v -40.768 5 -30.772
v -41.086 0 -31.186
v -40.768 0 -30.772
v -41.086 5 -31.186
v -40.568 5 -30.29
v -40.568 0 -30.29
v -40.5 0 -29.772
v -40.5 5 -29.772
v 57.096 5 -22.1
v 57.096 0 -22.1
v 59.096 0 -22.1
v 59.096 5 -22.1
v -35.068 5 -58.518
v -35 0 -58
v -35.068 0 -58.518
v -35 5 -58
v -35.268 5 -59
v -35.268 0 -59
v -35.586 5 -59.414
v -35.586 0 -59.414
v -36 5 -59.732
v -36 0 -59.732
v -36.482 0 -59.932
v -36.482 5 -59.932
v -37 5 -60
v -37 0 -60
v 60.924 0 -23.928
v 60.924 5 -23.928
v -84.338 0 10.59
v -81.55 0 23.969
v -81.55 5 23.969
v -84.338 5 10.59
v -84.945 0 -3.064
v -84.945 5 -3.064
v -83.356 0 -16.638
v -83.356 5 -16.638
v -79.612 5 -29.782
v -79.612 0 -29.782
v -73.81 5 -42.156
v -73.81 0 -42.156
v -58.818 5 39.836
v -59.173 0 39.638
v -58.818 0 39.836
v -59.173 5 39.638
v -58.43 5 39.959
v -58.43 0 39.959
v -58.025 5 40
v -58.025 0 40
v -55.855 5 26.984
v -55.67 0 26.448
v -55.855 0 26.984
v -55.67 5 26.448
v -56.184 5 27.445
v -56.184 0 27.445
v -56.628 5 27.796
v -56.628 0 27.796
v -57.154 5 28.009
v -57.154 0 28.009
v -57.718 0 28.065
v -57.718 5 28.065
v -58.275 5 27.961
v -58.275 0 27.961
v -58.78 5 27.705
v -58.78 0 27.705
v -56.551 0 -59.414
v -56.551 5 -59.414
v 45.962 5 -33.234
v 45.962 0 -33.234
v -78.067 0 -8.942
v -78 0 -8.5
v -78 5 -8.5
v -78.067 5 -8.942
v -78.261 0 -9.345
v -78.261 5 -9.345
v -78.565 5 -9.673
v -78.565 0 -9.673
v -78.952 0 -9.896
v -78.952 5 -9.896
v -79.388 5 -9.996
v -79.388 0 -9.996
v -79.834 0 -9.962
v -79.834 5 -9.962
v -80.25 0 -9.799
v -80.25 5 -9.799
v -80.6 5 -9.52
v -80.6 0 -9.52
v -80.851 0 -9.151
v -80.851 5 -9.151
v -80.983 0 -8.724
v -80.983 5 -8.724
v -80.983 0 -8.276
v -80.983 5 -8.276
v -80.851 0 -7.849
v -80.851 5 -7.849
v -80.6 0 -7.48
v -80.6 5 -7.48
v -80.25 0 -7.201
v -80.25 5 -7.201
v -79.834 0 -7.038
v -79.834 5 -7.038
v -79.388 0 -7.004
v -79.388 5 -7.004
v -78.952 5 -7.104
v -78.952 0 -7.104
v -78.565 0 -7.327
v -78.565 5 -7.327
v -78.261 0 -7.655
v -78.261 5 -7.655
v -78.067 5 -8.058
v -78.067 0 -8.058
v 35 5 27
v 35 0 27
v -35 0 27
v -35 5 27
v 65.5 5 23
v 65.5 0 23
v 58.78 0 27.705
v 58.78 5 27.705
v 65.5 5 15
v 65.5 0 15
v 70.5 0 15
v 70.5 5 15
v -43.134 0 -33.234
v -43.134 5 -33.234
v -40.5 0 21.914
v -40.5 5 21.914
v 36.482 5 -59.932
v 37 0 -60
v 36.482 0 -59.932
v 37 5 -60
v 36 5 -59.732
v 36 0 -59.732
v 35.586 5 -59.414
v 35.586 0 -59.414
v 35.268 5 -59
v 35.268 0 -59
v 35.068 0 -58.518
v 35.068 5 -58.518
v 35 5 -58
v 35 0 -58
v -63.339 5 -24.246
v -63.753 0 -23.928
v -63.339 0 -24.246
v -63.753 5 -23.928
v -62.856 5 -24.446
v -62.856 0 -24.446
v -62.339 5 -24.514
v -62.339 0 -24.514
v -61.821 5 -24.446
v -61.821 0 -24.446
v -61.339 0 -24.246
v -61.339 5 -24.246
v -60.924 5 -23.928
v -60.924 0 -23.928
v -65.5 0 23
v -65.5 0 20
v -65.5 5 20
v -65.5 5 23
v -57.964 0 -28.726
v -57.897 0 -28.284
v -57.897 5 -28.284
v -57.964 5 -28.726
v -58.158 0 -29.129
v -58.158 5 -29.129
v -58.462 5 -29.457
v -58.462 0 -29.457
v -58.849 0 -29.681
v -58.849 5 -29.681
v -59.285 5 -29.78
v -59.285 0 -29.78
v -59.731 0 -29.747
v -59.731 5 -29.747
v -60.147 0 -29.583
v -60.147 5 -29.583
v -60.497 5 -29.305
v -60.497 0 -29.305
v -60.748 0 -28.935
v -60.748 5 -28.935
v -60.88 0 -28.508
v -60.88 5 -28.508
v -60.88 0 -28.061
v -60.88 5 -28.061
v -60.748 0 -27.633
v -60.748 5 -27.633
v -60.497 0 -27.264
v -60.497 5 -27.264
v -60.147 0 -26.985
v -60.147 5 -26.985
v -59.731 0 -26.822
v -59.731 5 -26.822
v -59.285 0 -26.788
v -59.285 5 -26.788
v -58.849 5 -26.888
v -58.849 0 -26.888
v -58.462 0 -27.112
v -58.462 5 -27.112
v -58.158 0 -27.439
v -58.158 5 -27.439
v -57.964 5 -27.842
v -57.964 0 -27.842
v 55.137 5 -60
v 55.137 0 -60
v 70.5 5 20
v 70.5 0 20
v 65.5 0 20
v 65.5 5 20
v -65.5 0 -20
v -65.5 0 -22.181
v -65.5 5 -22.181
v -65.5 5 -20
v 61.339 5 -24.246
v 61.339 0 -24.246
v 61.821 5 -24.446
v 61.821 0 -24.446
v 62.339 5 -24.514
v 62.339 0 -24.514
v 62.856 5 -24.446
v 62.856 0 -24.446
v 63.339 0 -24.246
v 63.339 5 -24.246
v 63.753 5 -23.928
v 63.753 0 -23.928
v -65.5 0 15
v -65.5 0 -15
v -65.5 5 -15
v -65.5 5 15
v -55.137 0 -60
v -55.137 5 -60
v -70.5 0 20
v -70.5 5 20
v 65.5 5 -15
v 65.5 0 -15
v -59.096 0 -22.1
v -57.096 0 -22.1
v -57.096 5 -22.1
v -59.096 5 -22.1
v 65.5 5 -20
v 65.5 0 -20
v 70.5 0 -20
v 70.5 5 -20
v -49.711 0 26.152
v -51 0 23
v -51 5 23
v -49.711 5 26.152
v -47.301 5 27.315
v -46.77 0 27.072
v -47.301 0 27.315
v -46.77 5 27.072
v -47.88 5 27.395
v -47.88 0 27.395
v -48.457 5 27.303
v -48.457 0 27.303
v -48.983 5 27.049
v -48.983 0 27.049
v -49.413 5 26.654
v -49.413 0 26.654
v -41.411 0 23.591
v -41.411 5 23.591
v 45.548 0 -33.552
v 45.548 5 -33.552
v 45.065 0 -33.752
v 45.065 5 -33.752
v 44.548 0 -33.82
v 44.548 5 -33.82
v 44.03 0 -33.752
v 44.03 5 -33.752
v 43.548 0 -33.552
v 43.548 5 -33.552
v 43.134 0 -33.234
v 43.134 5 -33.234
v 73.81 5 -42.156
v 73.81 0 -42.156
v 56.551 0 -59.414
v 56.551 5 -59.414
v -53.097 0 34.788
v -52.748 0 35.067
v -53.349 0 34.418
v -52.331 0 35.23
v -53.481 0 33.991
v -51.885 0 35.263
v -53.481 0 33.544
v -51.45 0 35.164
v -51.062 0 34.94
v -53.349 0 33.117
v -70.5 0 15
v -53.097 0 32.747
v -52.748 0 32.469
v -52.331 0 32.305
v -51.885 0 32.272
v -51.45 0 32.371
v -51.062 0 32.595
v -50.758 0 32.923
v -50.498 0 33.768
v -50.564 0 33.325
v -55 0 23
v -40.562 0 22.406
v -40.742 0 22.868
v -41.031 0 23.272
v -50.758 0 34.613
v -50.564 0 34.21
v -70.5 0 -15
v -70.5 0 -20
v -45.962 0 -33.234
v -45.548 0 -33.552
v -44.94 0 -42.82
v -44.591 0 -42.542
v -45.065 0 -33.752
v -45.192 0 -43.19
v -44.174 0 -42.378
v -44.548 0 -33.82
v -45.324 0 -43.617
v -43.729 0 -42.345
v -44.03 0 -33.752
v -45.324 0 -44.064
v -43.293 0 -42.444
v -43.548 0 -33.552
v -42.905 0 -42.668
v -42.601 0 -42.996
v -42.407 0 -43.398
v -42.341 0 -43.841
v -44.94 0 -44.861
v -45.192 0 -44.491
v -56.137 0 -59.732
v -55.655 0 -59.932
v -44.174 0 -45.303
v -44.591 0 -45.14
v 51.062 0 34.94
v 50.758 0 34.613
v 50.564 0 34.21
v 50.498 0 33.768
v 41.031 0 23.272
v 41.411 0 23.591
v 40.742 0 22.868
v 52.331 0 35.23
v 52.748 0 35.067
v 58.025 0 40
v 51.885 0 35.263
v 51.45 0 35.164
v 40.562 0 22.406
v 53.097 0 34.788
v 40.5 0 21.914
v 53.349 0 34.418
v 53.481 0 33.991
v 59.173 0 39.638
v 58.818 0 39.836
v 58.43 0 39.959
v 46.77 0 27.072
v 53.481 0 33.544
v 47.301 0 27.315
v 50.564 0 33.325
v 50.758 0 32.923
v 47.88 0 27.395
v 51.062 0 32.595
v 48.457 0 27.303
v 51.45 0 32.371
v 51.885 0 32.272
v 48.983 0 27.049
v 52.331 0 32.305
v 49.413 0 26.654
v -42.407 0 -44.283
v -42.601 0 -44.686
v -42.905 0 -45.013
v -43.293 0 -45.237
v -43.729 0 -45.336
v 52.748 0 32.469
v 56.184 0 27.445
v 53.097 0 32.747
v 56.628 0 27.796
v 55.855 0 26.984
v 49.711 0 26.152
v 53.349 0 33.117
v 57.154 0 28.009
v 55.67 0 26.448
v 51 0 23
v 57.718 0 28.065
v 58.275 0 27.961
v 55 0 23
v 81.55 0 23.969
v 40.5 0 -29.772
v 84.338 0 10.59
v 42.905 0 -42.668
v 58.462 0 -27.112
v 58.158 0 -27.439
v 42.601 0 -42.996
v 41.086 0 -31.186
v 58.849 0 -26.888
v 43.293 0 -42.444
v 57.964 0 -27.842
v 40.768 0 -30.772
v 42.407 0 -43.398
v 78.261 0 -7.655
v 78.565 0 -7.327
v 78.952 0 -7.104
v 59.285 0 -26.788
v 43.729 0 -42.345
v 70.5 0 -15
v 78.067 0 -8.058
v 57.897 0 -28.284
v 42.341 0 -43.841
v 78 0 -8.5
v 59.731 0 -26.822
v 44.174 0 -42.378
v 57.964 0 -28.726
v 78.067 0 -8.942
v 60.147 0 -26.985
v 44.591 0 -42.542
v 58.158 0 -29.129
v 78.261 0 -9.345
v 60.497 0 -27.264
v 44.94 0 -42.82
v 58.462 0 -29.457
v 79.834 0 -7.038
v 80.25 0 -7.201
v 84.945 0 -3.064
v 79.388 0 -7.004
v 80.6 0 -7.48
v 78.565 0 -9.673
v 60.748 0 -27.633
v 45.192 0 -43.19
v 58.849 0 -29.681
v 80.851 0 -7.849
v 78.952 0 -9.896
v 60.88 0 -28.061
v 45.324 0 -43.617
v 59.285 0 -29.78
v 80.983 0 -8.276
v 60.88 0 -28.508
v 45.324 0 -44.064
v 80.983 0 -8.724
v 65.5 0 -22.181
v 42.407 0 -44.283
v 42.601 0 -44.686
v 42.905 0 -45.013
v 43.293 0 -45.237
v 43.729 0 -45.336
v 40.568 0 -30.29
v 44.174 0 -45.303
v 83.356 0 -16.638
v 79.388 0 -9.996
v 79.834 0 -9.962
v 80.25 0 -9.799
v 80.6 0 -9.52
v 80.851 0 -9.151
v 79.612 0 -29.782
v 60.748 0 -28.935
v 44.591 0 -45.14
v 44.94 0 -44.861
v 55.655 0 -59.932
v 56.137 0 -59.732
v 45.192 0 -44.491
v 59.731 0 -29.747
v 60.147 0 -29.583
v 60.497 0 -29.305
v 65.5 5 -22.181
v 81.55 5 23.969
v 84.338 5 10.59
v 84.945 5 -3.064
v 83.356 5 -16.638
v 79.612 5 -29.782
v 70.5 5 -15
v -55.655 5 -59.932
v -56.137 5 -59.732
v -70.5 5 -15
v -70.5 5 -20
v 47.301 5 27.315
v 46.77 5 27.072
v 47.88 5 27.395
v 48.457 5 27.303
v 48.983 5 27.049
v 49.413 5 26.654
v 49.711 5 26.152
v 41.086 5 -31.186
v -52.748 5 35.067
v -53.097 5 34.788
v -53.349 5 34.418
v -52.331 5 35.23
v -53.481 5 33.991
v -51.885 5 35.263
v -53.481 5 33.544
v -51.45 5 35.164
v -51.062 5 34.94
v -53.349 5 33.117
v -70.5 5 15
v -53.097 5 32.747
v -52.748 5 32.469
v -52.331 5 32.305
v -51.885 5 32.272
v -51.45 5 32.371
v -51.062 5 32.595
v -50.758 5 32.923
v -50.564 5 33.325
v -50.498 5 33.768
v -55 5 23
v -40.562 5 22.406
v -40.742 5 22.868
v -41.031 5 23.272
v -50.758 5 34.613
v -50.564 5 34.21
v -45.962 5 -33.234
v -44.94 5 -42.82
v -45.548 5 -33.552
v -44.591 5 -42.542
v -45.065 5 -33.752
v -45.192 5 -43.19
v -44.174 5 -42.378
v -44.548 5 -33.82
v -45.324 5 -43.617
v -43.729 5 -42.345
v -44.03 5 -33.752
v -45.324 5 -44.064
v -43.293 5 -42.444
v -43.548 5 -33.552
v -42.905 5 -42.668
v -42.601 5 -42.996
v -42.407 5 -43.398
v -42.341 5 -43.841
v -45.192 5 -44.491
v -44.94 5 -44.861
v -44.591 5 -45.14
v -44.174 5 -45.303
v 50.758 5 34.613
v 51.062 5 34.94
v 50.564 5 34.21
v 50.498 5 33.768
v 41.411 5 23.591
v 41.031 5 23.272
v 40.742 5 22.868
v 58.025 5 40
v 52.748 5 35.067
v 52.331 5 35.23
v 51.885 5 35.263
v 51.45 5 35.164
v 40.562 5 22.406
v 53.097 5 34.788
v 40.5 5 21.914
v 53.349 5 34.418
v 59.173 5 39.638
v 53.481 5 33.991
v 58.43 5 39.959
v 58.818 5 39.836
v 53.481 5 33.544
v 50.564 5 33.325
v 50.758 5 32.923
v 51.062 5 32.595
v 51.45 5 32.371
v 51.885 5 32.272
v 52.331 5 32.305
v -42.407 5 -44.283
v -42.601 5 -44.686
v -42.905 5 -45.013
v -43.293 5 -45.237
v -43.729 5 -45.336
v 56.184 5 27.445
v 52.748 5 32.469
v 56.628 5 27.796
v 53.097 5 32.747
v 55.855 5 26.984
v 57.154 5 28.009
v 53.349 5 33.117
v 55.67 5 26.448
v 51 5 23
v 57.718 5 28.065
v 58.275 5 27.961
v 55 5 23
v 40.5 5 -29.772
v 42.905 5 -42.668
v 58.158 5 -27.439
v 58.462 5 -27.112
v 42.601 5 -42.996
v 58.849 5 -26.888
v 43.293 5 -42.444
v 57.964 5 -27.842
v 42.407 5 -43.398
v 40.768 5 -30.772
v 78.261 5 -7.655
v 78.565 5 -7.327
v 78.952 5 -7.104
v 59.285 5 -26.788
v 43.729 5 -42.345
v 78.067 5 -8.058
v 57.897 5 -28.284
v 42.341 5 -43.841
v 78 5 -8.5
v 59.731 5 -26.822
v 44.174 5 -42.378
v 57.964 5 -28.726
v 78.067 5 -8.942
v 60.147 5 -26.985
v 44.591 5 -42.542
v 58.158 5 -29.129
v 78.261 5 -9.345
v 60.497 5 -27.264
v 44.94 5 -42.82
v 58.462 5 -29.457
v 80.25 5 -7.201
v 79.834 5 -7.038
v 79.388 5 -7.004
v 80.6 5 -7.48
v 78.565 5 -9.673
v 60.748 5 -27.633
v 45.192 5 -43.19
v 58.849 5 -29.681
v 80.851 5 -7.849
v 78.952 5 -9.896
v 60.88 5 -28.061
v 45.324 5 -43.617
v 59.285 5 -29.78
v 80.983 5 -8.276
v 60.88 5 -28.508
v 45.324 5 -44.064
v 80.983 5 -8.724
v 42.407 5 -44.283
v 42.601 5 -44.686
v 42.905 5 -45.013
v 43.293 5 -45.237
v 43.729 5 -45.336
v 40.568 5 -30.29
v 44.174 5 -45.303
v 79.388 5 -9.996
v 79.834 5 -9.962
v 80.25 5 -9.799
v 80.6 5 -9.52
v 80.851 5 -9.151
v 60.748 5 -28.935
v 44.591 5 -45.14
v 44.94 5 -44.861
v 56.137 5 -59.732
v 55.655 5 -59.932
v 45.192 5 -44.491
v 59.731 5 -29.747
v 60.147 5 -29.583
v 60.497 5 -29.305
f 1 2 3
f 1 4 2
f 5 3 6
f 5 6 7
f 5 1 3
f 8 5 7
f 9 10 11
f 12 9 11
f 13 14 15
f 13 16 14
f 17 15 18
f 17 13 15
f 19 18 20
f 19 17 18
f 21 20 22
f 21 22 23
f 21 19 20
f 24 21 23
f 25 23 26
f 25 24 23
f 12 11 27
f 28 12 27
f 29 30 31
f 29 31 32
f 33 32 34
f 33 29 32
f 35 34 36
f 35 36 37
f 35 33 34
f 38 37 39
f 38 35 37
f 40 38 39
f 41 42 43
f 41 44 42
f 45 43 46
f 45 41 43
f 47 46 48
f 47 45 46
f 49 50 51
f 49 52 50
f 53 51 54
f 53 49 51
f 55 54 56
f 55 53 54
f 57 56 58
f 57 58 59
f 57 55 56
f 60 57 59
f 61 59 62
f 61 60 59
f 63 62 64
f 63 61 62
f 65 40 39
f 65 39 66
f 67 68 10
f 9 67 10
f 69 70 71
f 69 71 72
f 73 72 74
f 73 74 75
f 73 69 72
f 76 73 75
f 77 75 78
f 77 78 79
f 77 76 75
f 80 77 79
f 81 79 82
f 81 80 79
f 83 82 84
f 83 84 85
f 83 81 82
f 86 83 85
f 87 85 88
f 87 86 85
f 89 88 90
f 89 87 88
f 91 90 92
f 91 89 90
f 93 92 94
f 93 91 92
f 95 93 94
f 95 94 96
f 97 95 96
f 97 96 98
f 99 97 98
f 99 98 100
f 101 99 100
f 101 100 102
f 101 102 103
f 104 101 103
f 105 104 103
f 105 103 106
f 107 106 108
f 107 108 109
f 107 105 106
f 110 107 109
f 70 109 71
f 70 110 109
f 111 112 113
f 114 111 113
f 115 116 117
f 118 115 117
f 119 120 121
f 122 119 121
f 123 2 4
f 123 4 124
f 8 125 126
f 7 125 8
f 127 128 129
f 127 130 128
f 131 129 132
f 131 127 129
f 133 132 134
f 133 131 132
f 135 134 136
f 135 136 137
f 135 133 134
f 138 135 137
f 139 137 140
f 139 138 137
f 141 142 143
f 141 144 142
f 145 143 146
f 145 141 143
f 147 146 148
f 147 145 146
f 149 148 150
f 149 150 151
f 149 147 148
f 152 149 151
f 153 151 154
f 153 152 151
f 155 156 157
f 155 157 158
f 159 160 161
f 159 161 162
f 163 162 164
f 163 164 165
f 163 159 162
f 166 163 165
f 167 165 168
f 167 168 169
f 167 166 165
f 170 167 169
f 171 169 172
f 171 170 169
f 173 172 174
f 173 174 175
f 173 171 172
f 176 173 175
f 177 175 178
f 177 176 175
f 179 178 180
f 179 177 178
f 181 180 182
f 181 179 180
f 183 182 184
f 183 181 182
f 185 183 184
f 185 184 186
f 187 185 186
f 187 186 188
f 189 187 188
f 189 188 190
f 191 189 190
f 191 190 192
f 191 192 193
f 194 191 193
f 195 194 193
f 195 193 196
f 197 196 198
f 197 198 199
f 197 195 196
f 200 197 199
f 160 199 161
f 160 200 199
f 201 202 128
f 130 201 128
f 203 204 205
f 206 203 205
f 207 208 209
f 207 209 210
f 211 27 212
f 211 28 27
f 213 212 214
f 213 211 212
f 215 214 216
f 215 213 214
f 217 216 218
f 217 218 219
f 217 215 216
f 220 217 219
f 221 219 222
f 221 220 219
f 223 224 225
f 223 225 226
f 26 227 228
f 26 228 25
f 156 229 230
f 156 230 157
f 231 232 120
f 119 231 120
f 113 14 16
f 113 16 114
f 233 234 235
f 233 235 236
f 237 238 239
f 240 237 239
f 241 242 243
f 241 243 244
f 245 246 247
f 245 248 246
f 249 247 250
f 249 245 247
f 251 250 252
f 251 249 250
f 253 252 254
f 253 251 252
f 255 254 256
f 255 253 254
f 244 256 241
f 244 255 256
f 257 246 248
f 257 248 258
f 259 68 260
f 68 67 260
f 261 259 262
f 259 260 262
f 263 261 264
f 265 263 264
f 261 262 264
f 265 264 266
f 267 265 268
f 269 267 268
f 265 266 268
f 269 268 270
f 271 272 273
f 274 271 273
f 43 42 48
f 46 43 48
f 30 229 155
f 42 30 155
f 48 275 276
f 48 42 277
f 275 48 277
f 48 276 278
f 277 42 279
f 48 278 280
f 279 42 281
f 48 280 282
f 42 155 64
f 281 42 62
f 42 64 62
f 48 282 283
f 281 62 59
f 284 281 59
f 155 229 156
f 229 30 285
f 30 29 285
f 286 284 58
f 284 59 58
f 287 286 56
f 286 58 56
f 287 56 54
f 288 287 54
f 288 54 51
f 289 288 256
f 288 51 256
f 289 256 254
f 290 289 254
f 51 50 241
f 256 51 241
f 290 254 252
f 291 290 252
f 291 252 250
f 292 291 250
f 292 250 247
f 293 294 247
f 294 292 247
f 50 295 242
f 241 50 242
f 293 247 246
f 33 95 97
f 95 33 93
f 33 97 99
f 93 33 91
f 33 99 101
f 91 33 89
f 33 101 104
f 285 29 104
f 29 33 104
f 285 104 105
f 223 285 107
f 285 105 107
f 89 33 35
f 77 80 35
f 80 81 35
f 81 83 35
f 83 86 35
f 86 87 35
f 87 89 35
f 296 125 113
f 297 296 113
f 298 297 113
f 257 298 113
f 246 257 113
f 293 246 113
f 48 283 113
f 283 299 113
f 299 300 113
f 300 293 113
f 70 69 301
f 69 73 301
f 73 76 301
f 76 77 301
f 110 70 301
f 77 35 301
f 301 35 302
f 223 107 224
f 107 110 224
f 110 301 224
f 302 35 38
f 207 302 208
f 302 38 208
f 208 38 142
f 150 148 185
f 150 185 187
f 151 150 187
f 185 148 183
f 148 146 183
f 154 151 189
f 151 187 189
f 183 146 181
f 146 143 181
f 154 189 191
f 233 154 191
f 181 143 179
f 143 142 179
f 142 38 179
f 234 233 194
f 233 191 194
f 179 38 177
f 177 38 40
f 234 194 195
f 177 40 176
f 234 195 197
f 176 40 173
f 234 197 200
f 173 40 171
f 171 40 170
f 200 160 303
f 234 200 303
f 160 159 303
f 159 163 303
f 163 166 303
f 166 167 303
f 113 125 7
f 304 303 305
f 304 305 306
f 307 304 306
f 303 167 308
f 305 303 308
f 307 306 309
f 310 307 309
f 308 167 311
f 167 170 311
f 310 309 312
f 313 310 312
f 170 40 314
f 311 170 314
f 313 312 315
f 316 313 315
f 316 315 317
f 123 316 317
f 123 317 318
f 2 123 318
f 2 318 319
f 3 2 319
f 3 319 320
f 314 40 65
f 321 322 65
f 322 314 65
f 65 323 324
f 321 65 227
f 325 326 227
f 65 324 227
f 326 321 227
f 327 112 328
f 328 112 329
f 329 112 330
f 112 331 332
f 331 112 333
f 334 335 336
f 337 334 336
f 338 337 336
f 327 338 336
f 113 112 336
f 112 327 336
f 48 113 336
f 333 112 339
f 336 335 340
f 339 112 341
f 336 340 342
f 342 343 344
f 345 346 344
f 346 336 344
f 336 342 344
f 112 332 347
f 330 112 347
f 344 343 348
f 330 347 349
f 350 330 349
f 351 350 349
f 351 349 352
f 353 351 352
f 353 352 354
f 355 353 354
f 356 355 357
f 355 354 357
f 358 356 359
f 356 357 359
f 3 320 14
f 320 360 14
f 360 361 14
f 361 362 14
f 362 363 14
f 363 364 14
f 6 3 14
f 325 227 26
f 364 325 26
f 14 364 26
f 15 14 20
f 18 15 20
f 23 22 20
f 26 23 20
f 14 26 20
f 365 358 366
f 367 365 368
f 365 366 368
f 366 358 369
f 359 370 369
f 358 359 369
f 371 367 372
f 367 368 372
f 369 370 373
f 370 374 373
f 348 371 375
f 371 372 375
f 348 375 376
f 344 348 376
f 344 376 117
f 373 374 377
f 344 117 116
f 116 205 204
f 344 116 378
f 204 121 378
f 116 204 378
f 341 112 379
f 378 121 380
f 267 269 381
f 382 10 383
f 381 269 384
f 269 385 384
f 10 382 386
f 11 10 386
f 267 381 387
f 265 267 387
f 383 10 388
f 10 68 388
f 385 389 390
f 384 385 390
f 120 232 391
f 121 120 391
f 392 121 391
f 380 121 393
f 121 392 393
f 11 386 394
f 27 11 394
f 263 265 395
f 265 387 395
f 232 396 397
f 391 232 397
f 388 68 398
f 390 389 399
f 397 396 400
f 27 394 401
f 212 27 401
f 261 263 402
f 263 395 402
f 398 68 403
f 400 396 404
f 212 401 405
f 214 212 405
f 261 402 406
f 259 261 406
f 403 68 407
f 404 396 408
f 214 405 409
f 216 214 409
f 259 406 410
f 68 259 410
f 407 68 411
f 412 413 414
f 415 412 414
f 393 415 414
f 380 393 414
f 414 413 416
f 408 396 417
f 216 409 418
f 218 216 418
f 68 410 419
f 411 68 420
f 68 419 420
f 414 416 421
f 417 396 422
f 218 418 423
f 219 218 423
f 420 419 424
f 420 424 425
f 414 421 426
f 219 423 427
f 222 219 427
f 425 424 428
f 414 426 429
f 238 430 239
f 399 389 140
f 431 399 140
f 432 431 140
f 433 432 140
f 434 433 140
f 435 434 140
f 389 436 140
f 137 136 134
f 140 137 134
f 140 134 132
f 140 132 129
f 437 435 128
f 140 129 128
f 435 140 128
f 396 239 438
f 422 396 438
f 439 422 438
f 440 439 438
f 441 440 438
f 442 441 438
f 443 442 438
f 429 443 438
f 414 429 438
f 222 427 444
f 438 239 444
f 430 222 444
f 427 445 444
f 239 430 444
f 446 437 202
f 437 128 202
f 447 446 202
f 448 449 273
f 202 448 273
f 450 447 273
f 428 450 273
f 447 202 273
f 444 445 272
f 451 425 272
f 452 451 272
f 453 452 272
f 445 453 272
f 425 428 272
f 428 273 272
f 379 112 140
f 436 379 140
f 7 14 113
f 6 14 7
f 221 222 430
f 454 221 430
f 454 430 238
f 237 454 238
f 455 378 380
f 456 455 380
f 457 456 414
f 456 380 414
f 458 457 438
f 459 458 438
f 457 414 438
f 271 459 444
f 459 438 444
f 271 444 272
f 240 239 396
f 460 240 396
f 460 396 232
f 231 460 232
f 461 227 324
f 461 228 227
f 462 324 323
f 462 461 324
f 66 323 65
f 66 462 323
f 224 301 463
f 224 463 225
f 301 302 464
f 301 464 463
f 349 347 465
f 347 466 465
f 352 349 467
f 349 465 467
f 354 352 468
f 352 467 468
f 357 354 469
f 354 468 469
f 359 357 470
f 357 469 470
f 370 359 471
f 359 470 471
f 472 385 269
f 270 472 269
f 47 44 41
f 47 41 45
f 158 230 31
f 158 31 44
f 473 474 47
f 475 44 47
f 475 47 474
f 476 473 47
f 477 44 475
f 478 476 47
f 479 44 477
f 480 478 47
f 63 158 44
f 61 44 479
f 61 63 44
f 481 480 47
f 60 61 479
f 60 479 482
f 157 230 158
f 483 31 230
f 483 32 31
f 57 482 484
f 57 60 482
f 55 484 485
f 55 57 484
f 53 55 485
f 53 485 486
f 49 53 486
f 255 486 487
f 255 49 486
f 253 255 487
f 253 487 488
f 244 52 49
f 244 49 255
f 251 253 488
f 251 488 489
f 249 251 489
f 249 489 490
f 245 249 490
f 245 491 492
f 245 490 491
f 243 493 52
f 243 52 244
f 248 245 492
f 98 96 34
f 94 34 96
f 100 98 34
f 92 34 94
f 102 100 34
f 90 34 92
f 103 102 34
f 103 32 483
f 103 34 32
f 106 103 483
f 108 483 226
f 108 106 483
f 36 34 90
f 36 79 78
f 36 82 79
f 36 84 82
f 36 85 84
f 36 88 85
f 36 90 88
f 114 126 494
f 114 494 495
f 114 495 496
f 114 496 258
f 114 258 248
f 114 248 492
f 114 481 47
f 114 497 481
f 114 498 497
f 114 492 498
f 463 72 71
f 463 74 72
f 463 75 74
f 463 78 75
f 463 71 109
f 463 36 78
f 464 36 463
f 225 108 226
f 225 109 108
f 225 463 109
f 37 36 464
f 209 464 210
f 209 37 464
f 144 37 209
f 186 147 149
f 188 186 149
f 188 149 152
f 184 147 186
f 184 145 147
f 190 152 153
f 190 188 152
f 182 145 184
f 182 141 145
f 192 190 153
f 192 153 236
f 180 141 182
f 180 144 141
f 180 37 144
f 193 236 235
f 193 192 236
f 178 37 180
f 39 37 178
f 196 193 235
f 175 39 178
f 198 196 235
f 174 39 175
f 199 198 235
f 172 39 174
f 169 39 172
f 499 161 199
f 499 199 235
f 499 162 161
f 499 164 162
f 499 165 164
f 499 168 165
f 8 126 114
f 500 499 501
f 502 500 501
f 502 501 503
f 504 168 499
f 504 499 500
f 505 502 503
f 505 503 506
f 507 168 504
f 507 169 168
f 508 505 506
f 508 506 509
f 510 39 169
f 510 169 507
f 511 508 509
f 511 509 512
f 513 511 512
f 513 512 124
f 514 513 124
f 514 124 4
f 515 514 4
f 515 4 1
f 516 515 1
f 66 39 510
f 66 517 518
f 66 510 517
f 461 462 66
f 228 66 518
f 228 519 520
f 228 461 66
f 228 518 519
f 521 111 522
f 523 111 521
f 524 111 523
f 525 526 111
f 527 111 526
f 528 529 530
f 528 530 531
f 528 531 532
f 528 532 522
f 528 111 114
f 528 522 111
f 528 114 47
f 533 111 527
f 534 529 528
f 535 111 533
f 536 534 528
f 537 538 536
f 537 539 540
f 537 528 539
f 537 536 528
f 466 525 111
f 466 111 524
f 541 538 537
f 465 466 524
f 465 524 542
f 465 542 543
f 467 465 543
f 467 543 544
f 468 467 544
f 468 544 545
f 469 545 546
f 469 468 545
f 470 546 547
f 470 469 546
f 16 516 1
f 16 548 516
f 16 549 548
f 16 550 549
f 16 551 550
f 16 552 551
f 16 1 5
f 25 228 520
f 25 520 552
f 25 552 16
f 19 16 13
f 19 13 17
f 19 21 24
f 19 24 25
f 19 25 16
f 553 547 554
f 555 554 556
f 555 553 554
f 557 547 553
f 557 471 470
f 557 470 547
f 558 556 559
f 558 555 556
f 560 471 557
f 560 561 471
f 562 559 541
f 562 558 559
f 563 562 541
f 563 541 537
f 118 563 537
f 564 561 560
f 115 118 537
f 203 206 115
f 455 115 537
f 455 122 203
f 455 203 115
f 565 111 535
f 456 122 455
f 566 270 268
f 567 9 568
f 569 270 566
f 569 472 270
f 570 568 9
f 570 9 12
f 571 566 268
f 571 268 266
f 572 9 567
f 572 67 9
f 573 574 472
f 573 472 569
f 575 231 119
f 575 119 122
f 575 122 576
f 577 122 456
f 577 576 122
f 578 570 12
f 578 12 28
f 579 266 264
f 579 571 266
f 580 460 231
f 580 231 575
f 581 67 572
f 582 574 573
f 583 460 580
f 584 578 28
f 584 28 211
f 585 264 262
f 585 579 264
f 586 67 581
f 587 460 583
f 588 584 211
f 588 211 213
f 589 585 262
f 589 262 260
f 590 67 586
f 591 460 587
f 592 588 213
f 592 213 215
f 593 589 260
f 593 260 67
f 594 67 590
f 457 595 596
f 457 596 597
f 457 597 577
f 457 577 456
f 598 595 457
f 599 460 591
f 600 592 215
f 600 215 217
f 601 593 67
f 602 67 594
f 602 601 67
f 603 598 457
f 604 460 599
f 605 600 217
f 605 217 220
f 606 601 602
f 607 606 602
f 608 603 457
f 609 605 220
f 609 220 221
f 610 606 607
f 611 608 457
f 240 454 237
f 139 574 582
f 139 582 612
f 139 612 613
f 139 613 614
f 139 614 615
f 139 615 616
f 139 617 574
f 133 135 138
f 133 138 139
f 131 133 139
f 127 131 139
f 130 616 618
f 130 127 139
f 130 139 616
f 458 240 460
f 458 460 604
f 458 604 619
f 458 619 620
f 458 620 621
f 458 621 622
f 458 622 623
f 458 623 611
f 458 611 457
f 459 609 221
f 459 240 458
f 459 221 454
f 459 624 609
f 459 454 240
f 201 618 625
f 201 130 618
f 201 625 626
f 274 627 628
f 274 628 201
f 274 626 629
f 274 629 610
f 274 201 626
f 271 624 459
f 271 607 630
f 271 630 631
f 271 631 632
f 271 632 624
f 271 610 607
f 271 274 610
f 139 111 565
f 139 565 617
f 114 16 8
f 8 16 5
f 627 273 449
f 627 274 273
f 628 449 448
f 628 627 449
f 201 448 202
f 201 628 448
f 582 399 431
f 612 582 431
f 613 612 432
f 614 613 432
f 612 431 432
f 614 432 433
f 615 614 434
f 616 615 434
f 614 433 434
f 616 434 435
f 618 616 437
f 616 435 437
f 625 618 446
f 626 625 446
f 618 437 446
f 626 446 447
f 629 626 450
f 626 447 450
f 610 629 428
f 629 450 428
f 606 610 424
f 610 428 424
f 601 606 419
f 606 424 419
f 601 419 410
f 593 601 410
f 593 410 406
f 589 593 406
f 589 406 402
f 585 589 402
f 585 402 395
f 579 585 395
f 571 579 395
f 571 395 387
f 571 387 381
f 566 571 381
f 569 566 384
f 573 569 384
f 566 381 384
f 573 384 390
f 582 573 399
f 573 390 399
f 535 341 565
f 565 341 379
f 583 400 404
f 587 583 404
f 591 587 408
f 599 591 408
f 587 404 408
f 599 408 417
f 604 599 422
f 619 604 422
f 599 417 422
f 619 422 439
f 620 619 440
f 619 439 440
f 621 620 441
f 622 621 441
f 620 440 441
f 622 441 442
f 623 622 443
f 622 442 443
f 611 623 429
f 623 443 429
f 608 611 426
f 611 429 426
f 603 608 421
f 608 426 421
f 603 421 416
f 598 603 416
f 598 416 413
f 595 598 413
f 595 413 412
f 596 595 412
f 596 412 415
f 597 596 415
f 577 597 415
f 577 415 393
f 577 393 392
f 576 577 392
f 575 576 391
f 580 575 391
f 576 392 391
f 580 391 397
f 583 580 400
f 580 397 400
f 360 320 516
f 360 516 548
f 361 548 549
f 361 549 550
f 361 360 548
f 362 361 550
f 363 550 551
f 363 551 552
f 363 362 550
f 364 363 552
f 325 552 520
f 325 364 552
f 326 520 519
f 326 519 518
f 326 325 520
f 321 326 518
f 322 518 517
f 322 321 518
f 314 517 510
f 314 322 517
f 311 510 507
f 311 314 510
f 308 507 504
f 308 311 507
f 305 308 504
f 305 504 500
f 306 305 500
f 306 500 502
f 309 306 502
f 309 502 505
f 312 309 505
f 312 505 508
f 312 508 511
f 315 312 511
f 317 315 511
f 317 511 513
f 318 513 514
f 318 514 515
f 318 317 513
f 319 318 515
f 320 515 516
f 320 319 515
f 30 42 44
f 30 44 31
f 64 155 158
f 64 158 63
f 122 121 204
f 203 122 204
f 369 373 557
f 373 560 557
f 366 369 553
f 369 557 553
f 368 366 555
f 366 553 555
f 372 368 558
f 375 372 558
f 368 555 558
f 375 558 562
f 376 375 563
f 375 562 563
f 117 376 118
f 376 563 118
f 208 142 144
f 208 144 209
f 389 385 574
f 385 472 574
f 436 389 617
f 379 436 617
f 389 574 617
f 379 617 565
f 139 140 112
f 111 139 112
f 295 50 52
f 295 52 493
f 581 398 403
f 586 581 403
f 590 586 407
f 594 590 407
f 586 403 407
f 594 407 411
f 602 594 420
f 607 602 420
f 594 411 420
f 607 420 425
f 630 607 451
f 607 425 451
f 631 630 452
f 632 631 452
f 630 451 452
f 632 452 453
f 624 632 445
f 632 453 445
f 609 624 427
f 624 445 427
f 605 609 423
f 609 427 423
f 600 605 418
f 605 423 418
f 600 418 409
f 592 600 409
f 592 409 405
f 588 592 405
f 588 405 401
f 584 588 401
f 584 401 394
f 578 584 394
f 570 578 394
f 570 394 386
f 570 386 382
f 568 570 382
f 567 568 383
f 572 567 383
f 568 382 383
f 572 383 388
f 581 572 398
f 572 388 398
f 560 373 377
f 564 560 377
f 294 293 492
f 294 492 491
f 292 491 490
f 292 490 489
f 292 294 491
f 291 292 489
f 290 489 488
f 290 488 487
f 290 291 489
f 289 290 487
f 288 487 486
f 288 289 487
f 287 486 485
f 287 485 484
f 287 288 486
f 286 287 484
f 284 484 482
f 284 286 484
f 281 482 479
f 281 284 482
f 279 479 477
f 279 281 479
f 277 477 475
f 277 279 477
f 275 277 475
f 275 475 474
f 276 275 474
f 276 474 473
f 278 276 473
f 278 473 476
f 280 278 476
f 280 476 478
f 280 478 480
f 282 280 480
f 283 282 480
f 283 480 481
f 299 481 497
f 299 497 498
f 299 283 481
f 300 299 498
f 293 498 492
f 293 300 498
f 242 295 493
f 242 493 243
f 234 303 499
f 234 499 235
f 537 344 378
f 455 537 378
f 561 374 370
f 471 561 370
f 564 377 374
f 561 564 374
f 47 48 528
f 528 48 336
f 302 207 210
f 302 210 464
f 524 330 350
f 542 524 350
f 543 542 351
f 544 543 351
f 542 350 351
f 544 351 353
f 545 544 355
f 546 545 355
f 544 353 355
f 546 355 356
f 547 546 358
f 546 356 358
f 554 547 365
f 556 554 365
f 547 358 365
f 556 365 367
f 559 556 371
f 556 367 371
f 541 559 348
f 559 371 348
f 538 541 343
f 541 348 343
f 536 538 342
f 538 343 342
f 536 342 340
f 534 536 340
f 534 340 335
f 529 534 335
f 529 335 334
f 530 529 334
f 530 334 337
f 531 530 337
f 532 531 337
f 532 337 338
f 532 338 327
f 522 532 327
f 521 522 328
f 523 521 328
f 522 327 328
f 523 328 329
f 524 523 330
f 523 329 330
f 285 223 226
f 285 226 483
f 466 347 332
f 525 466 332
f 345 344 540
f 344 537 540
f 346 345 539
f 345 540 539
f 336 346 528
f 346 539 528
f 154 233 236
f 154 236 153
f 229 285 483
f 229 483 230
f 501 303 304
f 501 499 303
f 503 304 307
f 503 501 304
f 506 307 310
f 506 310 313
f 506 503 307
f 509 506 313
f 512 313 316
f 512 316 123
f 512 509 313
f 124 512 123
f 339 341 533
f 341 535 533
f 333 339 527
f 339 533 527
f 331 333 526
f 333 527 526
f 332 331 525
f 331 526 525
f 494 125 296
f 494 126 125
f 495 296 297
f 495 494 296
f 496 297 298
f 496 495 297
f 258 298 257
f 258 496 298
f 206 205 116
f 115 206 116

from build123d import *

# Parameters (mm, degrees)
SKETCH1_R            = 1.5
BOSS_EXTRUDE1_DEPTH  = 5
FILLET1_R            = 2
FILLET1_OF_MIRROR1_R = 2
FILLET2_R            = 2


with BuildPart() as part:
    # Sketch1 → Boss-Extrude1 (new body)
    with BuildSketch(Plane(origin=(0, 0, 0), x_dir=(1, 0, 0), z_dir=(0, 1, 0))):
        with BuildLine():
            Line((-58.655951842, -40), (-81.550499093, -23.96906543))
            ThreePointArc((-81.550499093, -23.96906543), (-84.423538078, 9.882622039), (-73.809947849, 42.155564266))
            Line((-73.809947849, 42.155564266), (-55.965512115, 60))
            Line((-55.965512115, 60), (-35, 60))
            Line((-35, 60), (-35, -27))
            Line((-35, -27), (0, -27))
            Line((0, -27), (0, -40))
            Line((0, -40), (-58.655951842, -40))
        make_face()
        with Locations((-43.840620434, 43.840620434)):
            Circle(SKETCH1_R, mode=Mode.SUBTRACT)
        with Locations((-51.997575213, -33.767620171)):
            Circle(SKETCH1_R, mode=Mode.SUBTRACT)
        with Locations((-59.39696962, 28.284271247)):
            Circle(SKETCH1_R, mode=Mode.SUBTRACT)
        with Locations((-79.5, 8.5)):
            Circle(SKETCH1_R, mode=Mode.SUBTRACT)
        Polygon((-65.5, 22.181240867), (-65.5, 20), (-70.5, 20), (-70.5, 15), (-65.5, 15), (-65.5, -15), (-70.5, -15), (-70.5, -20), (-65.5, -20), (-65.5, -23), (-56.256832596, -29.472135493), (-55, -23), (-51, -23), (-48.796166422, -28.387593469), (-40.5, -23), (-40.5, 30.600505063), (-44.547727215, 34.648232278), (-57.095959493, 22.1), (-59.095959493, 22.1), (-62.33860018, 25.342640687), align=None, mode=Mode.SUBTRACT)
    boss_extrude1 = extrude(amount=BOSS_EXTRUDE1_DEPTH)

    # Fillet1
    fillet1_edges = [part.edges().sort_by_distance(p)[0] for p in [
        (-44.547727215, 2.5, -34.648232278),
        (-62.33860018, 2.5, -25.342640687),
        (-56.256832596, 2.5, 29.472135493),
        (-48.796166422, 2.5, 28.387593469),
        (-40.5, 2.5, 23),
        (-40.5, 2.5, -30.600505063),
    ]]
    fillet(fillet1_edges, radius=FILLET1_R)

    # Mirror1: Boss-Extrude1 across plane
    add(boss_extrude1.mirror(Plane(origin=(0, 0, 0), x_dir=(0, 0, 1), z_dir=(1, 0, 0))))

    # Fillet1 of Mirror1
    fillet1_of_mirror1_edges = [part.edges().sort_by_distance(p)[0] for p in [
        (44.547727215, 2.5, -34.648232278),
        (62.33860018, 2.5, -25.342640687),
        (56.256832596, 2.5, 29.472135493),
        (48.796166422, 2.5, 28.387593469),
        (40.5, 2.5, 23),
        (40.5, 2.5, -30.600505063),
    ]]
    fillet(fillet1_of_mirror1_edges, radius=FILLET1_OF_MIRROR1_R)

    # Fillet2
    fillet2_edges = [part.edges().sort_by_distance(p)[0] for p in [
        (-55.965512115, 2.5, -60),
        (-35, 2.5, -60),
        (-58.655951842, 2.5, 40),
        (55.965512115, 2.5, -60),
        (35, 2.5, -60),
        (58.655951842, 2.5, 40),
    ]]
    fillet(fillet2_edges, radius=FILLET2_R)


solid = part.part
